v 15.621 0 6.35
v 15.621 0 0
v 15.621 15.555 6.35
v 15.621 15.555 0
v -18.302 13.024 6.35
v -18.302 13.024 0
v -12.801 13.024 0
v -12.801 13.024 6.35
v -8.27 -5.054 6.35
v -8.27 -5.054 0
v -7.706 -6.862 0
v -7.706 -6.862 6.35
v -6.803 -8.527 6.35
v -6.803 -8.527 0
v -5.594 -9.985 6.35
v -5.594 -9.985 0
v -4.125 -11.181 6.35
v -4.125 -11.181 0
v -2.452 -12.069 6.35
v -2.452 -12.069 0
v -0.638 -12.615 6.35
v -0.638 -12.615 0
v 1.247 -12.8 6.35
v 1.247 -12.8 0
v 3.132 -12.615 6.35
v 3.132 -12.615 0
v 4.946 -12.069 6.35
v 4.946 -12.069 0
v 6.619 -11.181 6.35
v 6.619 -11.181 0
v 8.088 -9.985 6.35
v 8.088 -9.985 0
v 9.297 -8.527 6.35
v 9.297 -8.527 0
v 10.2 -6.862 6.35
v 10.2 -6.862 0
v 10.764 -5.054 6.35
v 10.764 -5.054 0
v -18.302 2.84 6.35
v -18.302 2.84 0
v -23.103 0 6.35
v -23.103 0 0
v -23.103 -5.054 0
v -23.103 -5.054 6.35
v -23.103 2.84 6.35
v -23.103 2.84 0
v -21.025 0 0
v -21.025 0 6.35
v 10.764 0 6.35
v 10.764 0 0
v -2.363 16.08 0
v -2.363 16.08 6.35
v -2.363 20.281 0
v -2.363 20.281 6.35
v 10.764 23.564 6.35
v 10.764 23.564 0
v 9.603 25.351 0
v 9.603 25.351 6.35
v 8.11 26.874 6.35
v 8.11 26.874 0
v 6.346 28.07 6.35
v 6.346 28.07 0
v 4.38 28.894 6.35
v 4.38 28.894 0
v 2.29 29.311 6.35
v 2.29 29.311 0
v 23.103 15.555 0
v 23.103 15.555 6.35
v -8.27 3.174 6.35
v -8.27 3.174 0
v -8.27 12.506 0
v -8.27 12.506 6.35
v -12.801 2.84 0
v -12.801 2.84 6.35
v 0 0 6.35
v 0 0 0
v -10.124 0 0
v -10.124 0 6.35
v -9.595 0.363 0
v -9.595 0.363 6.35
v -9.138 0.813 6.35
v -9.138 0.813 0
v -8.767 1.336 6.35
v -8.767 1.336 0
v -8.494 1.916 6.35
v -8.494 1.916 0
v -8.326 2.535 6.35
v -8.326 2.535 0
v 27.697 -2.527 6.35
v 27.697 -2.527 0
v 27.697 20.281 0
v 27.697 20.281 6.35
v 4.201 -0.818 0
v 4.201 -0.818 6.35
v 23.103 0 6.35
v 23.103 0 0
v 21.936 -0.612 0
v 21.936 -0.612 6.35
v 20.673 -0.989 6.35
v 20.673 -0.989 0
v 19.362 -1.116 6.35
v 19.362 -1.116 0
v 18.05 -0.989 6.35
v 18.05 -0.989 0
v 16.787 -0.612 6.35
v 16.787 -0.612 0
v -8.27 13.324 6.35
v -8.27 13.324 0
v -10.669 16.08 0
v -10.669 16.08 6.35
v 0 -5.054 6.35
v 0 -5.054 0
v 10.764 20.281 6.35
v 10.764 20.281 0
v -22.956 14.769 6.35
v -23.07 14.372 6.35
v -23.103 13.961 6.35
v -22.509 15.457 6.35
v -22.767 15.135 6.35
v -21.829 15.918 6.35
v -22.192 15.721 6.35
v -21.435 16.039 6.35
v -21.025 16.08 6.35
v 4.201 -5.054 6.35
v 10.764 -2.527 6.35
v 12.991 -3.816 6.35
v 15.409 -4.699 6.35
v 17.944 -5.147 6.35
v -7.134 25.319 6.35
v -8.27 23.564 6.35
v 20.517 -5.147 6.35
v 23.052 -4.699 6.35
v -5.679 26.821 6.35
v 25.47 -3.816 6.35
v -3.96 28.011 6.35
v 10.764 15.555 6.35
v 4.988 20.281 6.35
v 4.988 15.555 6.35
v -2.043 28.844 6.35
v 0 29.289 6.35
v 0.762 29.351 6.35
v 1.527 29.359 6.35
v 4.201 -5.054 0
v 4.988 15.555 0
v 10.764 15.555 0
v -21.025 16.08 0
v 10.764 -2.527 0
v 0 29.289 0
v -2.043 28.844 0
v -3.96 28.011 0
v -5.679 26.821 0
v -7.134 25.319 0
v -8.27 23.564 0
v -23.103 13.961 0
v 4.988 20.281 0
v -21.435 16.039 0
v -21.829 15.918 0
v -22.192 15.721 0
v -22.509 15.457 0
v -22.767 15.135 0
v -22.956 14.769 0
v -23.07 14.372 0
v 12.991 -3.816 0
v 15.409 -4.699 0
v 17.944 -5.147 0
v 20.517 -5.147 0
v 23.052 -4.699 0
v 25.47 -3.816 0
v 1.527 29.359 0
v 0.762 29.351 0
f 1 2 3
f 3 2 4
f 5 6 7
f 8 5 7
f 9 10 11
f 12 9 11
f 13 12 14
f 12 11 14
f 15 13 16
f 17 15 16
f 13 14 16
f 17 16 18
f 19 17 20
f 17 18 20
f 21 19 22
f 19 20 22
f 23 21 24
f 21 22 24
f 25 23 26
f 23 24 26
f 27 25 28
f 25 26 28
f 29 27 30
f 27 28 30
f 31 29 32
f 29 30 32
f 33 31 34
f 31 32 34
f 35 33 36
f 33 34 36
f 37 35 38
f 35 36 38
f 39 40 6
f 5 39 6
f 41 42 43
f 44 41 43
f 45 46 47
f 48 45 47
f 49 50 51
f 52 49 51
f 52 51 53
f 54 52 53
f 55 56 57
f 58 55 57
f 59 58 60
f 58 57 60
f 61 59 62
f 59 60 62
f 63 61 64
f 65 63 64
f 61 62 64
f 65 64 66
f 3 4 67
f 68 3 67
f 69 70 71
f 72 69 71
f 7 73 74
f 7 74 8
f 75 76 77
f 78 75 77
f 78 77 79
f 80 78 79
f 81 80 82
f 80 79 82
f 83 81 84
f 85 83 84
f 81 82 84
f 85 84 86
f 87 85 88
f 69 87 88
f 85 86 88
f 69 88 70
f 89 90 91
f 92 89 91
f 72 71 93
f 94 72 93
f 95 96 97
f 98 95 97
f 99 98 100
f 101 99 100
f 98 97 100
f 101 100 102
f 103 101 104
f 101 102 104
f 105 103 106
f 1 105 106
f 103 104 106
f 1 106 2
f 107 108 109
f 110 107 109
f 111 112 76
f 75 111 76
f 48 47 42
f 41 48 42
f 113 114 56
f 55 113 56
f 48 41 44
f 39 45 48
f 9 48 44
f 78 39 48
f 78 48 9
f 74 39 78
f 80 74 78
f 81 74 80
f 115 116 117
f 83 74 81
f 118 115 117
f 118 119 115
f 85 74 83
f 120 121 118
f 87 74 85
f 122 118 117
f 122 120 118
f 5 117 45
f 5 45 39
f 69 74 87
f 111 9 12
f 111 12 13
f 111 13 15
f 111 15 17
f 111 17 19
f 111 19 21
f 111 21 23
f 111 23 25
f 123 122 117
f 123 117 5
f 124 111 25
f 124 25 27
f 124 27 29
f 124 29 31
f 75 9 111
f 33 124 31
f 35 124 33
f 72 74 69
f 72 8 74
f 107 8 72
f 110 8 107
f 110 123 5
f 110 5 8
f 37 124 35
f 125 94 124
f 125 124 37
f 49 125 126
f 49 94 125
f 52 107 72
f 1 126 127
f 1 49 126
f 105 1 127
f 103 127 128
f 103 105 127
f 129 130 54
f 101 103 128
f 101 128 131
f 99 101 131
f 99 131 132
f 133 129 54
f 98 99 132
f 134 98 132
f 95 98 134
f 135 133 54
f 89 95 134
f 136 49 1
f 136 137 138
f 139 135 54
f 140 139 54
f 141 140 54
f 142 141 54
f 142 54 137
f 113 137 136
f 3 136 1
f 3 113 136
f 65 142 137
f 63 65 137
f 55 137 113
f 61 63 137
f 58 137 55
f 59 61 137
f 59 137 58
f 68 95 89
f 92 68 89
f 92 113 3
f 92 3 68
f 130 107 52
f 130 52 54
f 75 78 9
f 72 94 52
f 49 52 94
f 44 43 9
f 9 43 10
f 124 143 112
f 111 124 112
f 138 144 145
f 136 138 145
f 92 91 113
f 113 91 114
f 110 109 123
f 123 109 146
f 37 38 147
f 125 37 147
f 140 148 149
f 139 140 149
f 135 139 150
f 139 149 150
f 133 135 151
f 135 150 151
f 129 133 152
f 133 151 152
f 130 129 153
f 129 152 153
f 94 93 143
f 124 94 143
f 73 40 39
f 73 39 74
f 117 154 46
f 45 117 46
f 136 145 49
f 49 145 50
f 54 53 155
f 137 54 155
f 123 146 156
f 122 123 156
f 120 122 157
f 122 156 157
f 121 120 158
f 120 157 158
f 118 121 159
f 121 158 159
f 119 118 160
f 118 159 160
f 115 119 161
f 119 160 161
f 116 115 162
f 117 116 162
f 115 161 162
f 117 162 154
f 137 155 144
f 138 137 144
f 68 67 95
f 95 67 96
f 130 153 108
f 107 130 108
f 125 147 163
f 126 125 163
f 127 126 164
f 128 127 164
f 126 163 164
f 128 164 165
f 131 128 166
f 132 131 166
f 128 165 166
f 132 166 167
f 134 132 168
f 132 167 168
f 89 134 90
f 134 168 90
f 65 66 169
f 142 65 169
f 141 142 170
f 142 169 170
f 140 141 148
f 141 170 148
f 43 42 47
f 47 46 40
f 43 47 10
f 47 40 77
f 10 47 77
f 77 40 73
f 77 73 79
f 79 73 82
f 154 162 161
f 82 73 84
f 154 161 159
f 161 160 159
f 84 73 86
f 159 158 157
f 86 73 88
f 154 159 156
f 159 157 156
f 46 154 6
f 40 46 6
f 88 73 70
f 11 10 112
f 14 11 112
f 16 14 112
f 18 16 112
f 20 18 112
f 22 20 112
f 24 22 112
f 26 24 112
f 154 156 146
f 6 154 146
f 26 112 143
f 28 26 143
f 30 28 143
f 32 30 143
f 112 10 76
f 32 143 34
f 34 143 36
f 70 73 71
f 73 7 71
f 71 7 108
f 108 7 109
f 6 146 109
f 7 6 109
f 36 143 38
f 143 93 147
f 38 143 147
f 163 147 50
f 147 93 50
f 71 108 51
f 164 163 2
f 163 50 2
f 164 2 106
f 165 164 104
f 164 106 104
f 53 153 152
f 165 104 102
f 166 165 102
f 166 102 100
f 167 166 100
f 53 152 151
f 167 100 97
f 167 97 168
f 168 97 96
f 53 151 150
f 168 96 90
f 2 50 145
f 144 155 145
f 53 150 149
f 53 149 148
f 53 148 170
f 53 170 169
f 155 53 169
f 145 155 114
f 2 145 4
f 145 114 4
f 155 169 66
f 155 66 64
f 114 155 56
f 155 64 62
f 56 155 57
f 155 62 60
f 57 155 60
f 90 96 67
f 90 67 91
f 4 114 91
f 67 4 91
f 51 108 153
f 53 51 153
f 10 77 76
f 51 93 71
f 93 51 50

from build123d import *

# Parameters (mm, degrees)
F0_W     = 5.501232
F0_H     = 10.183676
F1_DEPTH = 6.35


with BuildPart() as f1:
    # F0 (on Top) → F1 (new body)
    with BuildSketch(Plane.XY):
        with BuildLine():
            Line((-21.024568, 0), (-23.102842, 0))
            Line((-23.102842, 0), (-23.102842, -5.053747))
            Line((-23.102842, -5.053747), (-8.269768, -5.053747))
            ThreePointArc((-8.269768, -5.053747), (1.247028, -12.800027), (10.763824, -5.053747))
            Line((10.763824, -5.053747), (10.763824, -2.526873))
            ThreePointArc((10.763824, -2.526873), (19.230491, -5.20295), (27.697158, -2.526873))
            Line((27.697158, -2.526873), (27.697158, 15.555039))
            Line((27.697158, 15.555039), (27.697158, 20.280621))
            Line((27.697158, 20.280621), (10.763824, 20.280621))
            Line((10.763824, 20.280621), (10.763824, 23.563793))
            ThreePointArc((10.763824, 23.563793), (7.258244, 27.516062), (2.289737, 29.311463))
            ThreePointArc((2.289737, 29.311463), (1.14428, 29.361855), (0, 29.289493))
            ThreePointArc((0, 29.289493), (-4.848945, 27.457979), (-8.269768, 23.563793))
            Line((-8.269768, 23.563793), (-8.269768, 13.323515))
            Line((-8.269768, 13.323515), (-10.668843, 16.080103))
            Line((-10.668843, 16.080103), (-15.686305, 16.080103))
            Line((-15.686305, 16.080103), (-20.0435, 16.080103))
            Line((-20.0435, 16.080103), (-21.024568, 16.080103))
            ThreePointArc((-21.024568, 16.080103), (-22.508695, 15.456849), (-23.102842, 13.960832))
            Line((-23.102842, 13.960832), (-23.102842, 12.142118))
            Line((-23.102842, 12.142118), (-23.102842, 8.040052))
            Line((-23.102842, 8.040052), (-23.102842, 2.839885))
            Line((-23.102842, 2.839885), (-21.024568, 0))
        make_face()
        with Locations((-15.551776, 7.931723)):
            Rectangle(F0_W, F0_H, mode=Mode.SUBTRACT)
        with BuildLine():
            Line((0, -5.053747), (0, 0))
            Line((0, 0), (-8.269768, 0))
            Line((-8.269768, 0), (-10.123806, 0))
            ThreePointArc((-10.123806, 0), (-8.76723, 1.336218), (-8.269768, 3.174236))
            Line((-8.269768, 3.174236), (-8.269768, 12.50577))
            Line((-8.269768, 12.50577), (4.200517, -0.817745))
            Line((4.200517, -0.817745), (4.200517, -5.053747))
            Line((4.200517, -5.053747), (0, -5.053747))
        make_face(mode=Mode.SUBTRACT)
        with BuildLine():
            Line((15.620673, 15.555039), (23.102842, 15.555039))
            Line((23.102842, 15.555039), (23.102842, 0))
            ThreePointArc((23.102842, 0), (19.361757, -1.116151), (15.620673, 0))
            Line((15.620673, 0), (15.620673, 15.555039))
        make_face(mode=Mode.SUBTRACT)
        Polygon((10.763824, 15.555039), (10.763824, 0), (-2.362791, 16.080103), (-2.362791, 20.280621), (4.988113, 20.280621), (4.988113, 15.555039), align=None, mode=Mode.SUBTRACT)
    extrude(amount=F1_DEPTH)


solid = f1.part
